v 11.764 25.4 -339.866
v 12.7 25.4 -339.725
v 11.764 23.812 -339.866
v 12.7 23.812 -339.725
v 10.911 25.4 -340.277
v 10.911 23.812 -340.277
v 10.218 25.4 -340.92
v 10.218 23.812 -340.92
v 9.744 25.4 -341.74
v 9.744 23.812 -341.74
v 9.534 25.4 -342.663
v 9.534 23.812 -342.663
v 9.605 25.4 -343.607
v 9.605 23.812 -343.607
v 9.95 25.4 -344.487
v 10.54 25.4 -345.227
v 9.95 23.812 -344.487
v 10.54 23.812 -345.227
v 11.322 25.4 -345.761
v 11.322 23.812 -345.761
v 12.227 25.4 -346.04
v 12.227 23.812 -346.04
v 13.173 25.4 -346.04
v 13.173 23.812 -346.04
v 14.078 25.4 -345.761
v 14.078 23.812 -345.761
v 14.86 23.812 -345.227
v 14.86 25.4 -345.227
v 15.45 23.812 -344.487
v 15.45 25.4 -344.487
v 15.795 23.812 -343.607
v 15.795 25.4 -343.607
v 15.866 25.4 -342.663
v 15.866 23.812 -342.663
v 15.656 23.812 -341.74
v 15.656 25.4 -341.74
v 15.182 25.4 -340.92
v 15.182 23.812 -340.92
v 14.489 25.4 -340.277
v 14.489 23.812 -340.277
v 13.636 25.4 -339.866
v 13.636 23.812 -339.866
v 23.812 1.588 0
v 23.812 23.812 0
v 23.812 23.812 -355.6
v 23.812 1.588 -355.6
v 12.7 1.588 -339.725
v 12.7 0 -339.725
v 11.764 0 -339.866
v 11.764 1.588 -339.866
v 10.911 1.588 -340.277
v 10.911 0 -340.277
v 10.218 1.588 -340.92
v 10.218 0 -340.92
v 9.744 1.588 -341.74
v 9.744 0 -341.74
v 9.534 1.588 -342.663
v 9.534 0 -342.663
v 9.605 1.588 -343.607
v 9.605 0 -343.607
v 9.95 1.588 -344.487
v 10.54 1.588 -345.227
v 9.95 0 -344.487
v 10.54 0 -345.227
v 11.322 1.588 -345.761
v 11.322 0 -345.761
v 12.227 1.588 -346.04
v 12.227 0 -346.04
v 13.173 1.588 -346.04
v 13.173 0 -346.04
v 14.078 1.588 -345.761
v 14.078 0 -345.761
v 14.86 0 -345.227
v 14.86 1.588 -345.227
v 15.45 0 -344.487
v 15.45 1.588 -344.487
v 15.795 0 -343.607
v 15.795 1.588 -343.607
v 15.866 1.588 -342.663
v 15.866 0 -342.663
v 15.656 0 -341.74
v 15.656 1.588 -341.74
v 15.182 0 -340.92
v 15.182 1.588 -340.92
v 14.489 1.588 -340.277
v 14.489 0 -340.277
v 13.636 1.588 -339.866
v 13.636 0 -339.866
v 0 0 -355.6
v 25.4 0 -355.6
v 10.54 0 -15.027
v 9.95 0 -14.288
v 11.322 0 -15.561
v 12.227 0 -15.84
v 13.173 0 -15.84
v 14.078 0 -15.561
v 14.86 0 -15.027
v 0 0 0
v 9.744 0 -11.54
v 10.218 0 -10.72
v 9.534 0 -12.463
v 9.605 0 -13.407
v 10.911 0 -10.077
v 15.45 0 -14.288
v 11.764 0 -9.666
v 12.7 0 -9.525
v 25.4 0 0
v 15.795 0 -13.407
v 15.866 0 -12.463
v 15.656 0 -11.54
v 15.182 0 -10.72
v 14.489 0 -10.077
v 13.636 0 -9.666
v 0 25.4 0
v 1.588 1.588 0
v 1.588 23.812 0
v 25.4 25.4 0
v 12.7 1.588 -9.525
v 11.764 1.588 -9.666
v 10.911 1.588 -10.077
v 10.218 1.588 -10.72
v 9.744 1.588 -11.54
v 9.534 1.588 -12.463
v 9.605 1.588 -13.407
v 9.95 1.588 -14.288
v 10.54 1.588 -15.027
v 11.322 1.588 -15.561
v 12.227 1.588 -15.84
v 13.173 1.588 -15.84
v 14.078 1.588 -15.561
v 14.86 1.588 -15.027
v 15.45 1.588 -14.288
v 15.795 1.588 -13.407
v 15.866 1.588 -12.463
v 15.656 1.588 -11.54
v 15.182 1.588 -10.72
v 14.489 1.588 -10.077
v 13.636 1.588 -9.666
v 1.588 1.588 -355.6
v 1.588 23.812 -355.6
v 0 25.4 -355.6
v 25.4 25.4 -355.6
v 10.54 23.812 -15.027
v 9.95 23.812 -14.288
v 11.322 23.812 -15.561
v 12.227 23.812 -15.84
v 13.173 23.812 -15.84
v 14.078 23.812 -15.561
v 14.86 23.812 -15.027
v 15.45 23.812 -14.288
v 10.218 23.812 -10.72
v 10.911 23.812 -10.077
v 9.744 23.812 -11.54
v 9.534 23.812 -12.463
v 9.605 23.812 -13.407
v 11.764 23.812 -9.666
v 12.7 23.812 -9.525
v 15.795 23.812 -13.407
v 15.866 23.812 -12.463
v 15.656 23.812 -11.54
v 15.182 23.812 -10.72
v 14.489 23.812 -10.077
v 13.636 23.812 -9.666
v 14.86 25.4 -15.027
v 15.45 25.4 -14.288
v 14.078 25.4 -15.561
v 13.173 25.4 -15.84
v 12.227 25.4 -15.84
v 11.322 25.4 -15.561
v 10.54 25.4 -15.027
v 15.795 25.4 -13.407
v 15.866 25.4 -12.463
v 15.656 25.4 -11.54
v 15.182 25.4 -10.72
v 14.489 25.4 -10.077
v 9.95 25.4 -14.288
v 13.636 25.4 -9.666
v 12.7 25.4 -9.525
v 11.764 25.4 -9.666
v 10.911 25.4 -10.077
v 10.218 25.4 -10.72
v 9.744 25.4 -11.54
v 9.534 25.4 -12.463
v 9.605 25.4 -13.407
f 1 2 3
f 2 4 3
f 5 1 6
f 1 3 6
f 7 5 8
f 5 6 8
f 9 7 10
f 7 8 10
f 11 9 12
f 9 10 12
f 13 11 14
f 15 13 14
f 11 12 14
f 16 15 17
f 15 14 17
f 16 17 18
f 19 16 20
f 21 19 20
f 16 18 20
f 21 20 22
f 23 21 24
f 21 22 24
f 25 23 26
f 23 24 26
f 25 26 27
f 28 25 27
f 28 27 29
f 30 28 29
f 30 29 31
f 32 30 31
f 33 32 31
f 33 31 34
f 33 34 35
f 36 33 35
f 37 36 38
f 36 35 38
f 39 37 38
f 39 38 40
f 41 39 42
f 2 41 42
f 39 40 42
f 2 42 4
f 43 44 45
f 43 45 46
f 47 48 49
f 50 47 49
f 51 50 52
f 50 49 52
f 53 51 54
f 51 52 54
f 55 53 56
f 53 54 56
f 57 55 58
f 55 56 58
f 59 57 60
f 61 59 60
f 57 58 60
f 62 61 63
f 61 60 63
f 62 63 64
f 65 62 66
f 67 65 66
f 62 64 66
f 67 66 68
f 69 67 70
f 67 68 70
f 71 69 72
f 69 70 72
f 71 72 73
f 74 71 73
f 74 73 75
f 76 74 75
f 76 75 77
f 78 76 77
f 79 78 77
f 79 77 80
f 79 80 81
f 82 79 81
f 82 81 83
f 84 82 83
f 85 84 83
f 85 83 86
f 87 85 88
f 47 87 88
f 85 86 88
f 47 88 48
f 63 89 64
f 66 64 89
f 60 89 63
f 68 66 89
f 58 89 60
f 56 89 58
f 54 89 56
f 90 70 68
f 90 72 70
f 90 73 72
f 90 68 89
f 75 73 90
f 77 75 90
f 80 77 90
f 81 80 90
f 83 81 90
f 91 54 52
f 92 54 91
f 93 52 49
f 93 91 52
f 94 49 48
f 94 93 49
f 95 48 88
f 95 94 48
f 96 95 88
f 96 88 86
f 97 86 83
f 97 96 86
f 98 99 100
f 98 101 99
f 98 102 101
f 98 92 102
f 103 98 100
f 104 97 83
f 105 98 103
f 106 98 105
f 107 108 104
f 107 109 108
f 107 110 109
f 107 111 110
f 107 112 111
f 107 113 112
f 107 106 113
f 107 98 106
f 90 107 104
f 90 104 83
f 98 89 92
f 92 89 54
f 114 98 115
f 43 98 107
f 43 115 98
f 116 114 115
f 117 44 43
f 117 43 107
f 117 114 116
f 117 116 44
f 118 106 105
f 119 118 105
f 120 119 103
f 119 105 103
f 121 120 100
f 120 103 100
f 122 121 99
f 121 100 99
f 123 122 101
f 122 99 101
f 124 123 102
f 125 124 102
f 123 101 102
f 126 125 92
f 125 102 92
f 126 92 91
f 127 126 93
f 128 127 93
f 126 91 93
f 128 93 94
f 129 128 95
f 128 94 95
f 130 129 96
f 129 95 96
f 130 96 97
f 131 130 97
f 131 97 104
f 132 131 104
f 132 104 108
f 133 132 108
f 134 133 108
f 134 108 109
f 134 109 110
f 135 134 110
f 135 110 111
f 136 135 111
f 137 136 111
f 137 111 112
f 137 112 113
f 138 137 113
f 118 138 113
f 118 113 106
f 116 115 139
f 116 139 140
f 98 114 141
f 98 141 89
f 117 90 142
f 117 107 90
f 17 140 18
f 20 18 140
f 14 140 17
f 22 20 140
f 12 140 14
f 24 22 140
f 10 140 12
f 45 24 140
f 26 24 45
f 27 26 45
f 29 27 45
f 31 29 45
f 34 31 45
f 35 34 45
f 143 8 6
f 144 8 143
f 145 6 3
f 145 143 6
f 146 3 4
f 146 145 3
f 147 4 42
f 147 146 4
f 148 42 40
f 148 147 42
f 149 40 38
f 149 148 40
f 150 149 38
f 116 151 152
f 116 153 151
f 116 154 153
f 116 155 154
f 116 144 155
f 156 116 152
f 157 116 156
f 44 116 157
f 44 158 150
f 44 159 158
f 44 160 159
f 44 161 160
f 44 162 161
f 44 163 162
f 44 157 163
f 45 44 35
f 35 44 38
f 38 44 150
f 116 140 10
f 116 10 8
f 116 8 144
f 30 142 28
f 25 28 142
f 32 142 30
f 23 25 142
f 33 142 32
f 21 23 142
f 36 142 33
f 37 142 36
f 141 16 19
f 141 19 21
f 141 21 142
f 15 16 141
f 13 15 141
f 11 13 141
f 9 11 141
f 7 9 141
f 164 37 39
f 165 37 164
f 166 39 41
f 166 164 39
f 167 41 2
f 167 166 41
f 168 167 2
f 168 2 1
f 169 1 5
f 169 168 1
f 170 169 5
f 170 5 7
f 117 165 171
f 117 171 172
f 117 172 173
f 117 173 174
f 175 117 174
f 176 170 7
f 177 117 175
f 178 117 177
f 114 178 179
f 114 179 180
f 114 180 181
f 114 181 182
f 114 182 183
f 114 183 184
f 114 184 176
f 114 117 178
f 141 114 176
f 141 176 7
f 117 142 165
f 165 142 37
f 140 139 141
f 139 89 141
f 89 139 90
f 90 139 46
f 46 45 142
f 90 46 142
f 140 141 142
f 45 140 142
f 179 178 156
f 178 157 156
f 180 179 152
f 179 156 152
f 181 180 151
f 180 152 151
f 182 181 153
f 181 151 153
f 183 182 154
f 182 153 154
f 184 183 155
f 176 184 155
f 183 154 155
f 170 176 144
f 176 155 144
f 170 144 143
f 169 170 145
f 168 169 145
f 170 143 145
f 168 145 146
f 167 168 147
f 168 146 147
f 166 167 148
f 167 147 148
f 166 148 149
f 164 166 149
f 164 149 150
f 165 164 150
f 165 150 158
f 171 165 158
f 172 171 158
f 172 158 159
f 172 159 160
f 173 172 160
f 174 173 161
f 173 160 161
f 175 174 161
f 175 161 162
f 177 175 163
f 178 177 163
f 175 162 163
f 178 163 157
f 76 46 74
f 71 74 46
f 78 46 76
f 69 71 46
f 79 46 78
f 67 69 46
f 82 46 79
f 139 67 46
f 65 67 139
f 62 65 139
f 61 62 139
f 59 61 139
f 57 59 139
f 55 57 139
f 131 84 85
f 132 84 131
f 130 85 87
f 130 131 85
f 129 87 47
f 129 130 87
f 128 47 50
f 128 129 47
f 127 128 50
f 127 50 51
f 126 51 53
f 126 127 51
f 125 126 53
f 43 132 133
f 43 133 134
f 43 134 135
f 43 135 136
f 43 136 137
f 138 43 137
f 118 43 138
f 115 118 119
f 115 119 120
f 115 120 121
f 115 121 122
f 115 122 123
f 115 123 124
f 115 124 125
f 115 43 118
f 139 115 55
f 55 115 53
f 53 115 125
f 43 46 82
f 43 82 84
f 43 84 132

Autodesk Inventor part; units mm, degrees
ref_plane "YZ Plane" through (0, 0, 0) normal (1, 0, 0) x (0, 1, 0)
ref_plane "XZ Plane" through (0, 0, 0) normal (0, 1, 0) x (-1, 0, 0)
ref_plane "XY Plane" through (0, 0, 0) normal (0, 0, 1) x (1, 0, 0)
sketch "Sketch1" plane through (0, 0, 0) normal (0, 0, 1) x (1, 0, 0)
  line L0 (0, 0) -> (25.4, 0)
  line L1 (25.4, 0) -> (25.4, 25.4)
  line L2 (25.4, 25.4) -> (0, 25.4)
  line L3 (0, 25.4) -> (0, 0)
  line L4 (1.5875, 23.8125) -> (23.8125, 23.8125)
  line L5 (23.8125, 23.8125) -> (23.8125, 1.5875)
  line L6 (23.8125, 1.5875) -> (1.5875, 1.5875)
  line L7 (1.5875, 1.5875) -> (1.5875, 23.8125)
  dimension "d0" = 25.4
  dimension "d1" = 25.4
  dimension "d2" = 1.5875
extrude "Extrusion1" add sketch "Sketch1" against normal blind 355.6
sketch "Sketch2" plane through (0, 25.4, 0) normal (0, 1, 0) x (1, 0, 0)
  line L0 (25.4, 355.6) -> (0, 355.6) projected
  line L1 (0, 0) -> (0, 355.6) projected
  line L2 (25.4, 0) -> (0, 0) projected
  point P0 (12.7, 12.7)
  point P1 (12.7, 342.9)
  dimension "d5" = 12.7
  dimension "d6" = 12.7
  dimension "d7" = 12.7
hole "Hole1" at (12.7, 25.4, -12.7) at (12.7, 25.4, -342.9) direction (0, -1, 0) diameter 6.35 depth 25.4 tip angle 118
properties part number "tube_m_r_in_mid"
